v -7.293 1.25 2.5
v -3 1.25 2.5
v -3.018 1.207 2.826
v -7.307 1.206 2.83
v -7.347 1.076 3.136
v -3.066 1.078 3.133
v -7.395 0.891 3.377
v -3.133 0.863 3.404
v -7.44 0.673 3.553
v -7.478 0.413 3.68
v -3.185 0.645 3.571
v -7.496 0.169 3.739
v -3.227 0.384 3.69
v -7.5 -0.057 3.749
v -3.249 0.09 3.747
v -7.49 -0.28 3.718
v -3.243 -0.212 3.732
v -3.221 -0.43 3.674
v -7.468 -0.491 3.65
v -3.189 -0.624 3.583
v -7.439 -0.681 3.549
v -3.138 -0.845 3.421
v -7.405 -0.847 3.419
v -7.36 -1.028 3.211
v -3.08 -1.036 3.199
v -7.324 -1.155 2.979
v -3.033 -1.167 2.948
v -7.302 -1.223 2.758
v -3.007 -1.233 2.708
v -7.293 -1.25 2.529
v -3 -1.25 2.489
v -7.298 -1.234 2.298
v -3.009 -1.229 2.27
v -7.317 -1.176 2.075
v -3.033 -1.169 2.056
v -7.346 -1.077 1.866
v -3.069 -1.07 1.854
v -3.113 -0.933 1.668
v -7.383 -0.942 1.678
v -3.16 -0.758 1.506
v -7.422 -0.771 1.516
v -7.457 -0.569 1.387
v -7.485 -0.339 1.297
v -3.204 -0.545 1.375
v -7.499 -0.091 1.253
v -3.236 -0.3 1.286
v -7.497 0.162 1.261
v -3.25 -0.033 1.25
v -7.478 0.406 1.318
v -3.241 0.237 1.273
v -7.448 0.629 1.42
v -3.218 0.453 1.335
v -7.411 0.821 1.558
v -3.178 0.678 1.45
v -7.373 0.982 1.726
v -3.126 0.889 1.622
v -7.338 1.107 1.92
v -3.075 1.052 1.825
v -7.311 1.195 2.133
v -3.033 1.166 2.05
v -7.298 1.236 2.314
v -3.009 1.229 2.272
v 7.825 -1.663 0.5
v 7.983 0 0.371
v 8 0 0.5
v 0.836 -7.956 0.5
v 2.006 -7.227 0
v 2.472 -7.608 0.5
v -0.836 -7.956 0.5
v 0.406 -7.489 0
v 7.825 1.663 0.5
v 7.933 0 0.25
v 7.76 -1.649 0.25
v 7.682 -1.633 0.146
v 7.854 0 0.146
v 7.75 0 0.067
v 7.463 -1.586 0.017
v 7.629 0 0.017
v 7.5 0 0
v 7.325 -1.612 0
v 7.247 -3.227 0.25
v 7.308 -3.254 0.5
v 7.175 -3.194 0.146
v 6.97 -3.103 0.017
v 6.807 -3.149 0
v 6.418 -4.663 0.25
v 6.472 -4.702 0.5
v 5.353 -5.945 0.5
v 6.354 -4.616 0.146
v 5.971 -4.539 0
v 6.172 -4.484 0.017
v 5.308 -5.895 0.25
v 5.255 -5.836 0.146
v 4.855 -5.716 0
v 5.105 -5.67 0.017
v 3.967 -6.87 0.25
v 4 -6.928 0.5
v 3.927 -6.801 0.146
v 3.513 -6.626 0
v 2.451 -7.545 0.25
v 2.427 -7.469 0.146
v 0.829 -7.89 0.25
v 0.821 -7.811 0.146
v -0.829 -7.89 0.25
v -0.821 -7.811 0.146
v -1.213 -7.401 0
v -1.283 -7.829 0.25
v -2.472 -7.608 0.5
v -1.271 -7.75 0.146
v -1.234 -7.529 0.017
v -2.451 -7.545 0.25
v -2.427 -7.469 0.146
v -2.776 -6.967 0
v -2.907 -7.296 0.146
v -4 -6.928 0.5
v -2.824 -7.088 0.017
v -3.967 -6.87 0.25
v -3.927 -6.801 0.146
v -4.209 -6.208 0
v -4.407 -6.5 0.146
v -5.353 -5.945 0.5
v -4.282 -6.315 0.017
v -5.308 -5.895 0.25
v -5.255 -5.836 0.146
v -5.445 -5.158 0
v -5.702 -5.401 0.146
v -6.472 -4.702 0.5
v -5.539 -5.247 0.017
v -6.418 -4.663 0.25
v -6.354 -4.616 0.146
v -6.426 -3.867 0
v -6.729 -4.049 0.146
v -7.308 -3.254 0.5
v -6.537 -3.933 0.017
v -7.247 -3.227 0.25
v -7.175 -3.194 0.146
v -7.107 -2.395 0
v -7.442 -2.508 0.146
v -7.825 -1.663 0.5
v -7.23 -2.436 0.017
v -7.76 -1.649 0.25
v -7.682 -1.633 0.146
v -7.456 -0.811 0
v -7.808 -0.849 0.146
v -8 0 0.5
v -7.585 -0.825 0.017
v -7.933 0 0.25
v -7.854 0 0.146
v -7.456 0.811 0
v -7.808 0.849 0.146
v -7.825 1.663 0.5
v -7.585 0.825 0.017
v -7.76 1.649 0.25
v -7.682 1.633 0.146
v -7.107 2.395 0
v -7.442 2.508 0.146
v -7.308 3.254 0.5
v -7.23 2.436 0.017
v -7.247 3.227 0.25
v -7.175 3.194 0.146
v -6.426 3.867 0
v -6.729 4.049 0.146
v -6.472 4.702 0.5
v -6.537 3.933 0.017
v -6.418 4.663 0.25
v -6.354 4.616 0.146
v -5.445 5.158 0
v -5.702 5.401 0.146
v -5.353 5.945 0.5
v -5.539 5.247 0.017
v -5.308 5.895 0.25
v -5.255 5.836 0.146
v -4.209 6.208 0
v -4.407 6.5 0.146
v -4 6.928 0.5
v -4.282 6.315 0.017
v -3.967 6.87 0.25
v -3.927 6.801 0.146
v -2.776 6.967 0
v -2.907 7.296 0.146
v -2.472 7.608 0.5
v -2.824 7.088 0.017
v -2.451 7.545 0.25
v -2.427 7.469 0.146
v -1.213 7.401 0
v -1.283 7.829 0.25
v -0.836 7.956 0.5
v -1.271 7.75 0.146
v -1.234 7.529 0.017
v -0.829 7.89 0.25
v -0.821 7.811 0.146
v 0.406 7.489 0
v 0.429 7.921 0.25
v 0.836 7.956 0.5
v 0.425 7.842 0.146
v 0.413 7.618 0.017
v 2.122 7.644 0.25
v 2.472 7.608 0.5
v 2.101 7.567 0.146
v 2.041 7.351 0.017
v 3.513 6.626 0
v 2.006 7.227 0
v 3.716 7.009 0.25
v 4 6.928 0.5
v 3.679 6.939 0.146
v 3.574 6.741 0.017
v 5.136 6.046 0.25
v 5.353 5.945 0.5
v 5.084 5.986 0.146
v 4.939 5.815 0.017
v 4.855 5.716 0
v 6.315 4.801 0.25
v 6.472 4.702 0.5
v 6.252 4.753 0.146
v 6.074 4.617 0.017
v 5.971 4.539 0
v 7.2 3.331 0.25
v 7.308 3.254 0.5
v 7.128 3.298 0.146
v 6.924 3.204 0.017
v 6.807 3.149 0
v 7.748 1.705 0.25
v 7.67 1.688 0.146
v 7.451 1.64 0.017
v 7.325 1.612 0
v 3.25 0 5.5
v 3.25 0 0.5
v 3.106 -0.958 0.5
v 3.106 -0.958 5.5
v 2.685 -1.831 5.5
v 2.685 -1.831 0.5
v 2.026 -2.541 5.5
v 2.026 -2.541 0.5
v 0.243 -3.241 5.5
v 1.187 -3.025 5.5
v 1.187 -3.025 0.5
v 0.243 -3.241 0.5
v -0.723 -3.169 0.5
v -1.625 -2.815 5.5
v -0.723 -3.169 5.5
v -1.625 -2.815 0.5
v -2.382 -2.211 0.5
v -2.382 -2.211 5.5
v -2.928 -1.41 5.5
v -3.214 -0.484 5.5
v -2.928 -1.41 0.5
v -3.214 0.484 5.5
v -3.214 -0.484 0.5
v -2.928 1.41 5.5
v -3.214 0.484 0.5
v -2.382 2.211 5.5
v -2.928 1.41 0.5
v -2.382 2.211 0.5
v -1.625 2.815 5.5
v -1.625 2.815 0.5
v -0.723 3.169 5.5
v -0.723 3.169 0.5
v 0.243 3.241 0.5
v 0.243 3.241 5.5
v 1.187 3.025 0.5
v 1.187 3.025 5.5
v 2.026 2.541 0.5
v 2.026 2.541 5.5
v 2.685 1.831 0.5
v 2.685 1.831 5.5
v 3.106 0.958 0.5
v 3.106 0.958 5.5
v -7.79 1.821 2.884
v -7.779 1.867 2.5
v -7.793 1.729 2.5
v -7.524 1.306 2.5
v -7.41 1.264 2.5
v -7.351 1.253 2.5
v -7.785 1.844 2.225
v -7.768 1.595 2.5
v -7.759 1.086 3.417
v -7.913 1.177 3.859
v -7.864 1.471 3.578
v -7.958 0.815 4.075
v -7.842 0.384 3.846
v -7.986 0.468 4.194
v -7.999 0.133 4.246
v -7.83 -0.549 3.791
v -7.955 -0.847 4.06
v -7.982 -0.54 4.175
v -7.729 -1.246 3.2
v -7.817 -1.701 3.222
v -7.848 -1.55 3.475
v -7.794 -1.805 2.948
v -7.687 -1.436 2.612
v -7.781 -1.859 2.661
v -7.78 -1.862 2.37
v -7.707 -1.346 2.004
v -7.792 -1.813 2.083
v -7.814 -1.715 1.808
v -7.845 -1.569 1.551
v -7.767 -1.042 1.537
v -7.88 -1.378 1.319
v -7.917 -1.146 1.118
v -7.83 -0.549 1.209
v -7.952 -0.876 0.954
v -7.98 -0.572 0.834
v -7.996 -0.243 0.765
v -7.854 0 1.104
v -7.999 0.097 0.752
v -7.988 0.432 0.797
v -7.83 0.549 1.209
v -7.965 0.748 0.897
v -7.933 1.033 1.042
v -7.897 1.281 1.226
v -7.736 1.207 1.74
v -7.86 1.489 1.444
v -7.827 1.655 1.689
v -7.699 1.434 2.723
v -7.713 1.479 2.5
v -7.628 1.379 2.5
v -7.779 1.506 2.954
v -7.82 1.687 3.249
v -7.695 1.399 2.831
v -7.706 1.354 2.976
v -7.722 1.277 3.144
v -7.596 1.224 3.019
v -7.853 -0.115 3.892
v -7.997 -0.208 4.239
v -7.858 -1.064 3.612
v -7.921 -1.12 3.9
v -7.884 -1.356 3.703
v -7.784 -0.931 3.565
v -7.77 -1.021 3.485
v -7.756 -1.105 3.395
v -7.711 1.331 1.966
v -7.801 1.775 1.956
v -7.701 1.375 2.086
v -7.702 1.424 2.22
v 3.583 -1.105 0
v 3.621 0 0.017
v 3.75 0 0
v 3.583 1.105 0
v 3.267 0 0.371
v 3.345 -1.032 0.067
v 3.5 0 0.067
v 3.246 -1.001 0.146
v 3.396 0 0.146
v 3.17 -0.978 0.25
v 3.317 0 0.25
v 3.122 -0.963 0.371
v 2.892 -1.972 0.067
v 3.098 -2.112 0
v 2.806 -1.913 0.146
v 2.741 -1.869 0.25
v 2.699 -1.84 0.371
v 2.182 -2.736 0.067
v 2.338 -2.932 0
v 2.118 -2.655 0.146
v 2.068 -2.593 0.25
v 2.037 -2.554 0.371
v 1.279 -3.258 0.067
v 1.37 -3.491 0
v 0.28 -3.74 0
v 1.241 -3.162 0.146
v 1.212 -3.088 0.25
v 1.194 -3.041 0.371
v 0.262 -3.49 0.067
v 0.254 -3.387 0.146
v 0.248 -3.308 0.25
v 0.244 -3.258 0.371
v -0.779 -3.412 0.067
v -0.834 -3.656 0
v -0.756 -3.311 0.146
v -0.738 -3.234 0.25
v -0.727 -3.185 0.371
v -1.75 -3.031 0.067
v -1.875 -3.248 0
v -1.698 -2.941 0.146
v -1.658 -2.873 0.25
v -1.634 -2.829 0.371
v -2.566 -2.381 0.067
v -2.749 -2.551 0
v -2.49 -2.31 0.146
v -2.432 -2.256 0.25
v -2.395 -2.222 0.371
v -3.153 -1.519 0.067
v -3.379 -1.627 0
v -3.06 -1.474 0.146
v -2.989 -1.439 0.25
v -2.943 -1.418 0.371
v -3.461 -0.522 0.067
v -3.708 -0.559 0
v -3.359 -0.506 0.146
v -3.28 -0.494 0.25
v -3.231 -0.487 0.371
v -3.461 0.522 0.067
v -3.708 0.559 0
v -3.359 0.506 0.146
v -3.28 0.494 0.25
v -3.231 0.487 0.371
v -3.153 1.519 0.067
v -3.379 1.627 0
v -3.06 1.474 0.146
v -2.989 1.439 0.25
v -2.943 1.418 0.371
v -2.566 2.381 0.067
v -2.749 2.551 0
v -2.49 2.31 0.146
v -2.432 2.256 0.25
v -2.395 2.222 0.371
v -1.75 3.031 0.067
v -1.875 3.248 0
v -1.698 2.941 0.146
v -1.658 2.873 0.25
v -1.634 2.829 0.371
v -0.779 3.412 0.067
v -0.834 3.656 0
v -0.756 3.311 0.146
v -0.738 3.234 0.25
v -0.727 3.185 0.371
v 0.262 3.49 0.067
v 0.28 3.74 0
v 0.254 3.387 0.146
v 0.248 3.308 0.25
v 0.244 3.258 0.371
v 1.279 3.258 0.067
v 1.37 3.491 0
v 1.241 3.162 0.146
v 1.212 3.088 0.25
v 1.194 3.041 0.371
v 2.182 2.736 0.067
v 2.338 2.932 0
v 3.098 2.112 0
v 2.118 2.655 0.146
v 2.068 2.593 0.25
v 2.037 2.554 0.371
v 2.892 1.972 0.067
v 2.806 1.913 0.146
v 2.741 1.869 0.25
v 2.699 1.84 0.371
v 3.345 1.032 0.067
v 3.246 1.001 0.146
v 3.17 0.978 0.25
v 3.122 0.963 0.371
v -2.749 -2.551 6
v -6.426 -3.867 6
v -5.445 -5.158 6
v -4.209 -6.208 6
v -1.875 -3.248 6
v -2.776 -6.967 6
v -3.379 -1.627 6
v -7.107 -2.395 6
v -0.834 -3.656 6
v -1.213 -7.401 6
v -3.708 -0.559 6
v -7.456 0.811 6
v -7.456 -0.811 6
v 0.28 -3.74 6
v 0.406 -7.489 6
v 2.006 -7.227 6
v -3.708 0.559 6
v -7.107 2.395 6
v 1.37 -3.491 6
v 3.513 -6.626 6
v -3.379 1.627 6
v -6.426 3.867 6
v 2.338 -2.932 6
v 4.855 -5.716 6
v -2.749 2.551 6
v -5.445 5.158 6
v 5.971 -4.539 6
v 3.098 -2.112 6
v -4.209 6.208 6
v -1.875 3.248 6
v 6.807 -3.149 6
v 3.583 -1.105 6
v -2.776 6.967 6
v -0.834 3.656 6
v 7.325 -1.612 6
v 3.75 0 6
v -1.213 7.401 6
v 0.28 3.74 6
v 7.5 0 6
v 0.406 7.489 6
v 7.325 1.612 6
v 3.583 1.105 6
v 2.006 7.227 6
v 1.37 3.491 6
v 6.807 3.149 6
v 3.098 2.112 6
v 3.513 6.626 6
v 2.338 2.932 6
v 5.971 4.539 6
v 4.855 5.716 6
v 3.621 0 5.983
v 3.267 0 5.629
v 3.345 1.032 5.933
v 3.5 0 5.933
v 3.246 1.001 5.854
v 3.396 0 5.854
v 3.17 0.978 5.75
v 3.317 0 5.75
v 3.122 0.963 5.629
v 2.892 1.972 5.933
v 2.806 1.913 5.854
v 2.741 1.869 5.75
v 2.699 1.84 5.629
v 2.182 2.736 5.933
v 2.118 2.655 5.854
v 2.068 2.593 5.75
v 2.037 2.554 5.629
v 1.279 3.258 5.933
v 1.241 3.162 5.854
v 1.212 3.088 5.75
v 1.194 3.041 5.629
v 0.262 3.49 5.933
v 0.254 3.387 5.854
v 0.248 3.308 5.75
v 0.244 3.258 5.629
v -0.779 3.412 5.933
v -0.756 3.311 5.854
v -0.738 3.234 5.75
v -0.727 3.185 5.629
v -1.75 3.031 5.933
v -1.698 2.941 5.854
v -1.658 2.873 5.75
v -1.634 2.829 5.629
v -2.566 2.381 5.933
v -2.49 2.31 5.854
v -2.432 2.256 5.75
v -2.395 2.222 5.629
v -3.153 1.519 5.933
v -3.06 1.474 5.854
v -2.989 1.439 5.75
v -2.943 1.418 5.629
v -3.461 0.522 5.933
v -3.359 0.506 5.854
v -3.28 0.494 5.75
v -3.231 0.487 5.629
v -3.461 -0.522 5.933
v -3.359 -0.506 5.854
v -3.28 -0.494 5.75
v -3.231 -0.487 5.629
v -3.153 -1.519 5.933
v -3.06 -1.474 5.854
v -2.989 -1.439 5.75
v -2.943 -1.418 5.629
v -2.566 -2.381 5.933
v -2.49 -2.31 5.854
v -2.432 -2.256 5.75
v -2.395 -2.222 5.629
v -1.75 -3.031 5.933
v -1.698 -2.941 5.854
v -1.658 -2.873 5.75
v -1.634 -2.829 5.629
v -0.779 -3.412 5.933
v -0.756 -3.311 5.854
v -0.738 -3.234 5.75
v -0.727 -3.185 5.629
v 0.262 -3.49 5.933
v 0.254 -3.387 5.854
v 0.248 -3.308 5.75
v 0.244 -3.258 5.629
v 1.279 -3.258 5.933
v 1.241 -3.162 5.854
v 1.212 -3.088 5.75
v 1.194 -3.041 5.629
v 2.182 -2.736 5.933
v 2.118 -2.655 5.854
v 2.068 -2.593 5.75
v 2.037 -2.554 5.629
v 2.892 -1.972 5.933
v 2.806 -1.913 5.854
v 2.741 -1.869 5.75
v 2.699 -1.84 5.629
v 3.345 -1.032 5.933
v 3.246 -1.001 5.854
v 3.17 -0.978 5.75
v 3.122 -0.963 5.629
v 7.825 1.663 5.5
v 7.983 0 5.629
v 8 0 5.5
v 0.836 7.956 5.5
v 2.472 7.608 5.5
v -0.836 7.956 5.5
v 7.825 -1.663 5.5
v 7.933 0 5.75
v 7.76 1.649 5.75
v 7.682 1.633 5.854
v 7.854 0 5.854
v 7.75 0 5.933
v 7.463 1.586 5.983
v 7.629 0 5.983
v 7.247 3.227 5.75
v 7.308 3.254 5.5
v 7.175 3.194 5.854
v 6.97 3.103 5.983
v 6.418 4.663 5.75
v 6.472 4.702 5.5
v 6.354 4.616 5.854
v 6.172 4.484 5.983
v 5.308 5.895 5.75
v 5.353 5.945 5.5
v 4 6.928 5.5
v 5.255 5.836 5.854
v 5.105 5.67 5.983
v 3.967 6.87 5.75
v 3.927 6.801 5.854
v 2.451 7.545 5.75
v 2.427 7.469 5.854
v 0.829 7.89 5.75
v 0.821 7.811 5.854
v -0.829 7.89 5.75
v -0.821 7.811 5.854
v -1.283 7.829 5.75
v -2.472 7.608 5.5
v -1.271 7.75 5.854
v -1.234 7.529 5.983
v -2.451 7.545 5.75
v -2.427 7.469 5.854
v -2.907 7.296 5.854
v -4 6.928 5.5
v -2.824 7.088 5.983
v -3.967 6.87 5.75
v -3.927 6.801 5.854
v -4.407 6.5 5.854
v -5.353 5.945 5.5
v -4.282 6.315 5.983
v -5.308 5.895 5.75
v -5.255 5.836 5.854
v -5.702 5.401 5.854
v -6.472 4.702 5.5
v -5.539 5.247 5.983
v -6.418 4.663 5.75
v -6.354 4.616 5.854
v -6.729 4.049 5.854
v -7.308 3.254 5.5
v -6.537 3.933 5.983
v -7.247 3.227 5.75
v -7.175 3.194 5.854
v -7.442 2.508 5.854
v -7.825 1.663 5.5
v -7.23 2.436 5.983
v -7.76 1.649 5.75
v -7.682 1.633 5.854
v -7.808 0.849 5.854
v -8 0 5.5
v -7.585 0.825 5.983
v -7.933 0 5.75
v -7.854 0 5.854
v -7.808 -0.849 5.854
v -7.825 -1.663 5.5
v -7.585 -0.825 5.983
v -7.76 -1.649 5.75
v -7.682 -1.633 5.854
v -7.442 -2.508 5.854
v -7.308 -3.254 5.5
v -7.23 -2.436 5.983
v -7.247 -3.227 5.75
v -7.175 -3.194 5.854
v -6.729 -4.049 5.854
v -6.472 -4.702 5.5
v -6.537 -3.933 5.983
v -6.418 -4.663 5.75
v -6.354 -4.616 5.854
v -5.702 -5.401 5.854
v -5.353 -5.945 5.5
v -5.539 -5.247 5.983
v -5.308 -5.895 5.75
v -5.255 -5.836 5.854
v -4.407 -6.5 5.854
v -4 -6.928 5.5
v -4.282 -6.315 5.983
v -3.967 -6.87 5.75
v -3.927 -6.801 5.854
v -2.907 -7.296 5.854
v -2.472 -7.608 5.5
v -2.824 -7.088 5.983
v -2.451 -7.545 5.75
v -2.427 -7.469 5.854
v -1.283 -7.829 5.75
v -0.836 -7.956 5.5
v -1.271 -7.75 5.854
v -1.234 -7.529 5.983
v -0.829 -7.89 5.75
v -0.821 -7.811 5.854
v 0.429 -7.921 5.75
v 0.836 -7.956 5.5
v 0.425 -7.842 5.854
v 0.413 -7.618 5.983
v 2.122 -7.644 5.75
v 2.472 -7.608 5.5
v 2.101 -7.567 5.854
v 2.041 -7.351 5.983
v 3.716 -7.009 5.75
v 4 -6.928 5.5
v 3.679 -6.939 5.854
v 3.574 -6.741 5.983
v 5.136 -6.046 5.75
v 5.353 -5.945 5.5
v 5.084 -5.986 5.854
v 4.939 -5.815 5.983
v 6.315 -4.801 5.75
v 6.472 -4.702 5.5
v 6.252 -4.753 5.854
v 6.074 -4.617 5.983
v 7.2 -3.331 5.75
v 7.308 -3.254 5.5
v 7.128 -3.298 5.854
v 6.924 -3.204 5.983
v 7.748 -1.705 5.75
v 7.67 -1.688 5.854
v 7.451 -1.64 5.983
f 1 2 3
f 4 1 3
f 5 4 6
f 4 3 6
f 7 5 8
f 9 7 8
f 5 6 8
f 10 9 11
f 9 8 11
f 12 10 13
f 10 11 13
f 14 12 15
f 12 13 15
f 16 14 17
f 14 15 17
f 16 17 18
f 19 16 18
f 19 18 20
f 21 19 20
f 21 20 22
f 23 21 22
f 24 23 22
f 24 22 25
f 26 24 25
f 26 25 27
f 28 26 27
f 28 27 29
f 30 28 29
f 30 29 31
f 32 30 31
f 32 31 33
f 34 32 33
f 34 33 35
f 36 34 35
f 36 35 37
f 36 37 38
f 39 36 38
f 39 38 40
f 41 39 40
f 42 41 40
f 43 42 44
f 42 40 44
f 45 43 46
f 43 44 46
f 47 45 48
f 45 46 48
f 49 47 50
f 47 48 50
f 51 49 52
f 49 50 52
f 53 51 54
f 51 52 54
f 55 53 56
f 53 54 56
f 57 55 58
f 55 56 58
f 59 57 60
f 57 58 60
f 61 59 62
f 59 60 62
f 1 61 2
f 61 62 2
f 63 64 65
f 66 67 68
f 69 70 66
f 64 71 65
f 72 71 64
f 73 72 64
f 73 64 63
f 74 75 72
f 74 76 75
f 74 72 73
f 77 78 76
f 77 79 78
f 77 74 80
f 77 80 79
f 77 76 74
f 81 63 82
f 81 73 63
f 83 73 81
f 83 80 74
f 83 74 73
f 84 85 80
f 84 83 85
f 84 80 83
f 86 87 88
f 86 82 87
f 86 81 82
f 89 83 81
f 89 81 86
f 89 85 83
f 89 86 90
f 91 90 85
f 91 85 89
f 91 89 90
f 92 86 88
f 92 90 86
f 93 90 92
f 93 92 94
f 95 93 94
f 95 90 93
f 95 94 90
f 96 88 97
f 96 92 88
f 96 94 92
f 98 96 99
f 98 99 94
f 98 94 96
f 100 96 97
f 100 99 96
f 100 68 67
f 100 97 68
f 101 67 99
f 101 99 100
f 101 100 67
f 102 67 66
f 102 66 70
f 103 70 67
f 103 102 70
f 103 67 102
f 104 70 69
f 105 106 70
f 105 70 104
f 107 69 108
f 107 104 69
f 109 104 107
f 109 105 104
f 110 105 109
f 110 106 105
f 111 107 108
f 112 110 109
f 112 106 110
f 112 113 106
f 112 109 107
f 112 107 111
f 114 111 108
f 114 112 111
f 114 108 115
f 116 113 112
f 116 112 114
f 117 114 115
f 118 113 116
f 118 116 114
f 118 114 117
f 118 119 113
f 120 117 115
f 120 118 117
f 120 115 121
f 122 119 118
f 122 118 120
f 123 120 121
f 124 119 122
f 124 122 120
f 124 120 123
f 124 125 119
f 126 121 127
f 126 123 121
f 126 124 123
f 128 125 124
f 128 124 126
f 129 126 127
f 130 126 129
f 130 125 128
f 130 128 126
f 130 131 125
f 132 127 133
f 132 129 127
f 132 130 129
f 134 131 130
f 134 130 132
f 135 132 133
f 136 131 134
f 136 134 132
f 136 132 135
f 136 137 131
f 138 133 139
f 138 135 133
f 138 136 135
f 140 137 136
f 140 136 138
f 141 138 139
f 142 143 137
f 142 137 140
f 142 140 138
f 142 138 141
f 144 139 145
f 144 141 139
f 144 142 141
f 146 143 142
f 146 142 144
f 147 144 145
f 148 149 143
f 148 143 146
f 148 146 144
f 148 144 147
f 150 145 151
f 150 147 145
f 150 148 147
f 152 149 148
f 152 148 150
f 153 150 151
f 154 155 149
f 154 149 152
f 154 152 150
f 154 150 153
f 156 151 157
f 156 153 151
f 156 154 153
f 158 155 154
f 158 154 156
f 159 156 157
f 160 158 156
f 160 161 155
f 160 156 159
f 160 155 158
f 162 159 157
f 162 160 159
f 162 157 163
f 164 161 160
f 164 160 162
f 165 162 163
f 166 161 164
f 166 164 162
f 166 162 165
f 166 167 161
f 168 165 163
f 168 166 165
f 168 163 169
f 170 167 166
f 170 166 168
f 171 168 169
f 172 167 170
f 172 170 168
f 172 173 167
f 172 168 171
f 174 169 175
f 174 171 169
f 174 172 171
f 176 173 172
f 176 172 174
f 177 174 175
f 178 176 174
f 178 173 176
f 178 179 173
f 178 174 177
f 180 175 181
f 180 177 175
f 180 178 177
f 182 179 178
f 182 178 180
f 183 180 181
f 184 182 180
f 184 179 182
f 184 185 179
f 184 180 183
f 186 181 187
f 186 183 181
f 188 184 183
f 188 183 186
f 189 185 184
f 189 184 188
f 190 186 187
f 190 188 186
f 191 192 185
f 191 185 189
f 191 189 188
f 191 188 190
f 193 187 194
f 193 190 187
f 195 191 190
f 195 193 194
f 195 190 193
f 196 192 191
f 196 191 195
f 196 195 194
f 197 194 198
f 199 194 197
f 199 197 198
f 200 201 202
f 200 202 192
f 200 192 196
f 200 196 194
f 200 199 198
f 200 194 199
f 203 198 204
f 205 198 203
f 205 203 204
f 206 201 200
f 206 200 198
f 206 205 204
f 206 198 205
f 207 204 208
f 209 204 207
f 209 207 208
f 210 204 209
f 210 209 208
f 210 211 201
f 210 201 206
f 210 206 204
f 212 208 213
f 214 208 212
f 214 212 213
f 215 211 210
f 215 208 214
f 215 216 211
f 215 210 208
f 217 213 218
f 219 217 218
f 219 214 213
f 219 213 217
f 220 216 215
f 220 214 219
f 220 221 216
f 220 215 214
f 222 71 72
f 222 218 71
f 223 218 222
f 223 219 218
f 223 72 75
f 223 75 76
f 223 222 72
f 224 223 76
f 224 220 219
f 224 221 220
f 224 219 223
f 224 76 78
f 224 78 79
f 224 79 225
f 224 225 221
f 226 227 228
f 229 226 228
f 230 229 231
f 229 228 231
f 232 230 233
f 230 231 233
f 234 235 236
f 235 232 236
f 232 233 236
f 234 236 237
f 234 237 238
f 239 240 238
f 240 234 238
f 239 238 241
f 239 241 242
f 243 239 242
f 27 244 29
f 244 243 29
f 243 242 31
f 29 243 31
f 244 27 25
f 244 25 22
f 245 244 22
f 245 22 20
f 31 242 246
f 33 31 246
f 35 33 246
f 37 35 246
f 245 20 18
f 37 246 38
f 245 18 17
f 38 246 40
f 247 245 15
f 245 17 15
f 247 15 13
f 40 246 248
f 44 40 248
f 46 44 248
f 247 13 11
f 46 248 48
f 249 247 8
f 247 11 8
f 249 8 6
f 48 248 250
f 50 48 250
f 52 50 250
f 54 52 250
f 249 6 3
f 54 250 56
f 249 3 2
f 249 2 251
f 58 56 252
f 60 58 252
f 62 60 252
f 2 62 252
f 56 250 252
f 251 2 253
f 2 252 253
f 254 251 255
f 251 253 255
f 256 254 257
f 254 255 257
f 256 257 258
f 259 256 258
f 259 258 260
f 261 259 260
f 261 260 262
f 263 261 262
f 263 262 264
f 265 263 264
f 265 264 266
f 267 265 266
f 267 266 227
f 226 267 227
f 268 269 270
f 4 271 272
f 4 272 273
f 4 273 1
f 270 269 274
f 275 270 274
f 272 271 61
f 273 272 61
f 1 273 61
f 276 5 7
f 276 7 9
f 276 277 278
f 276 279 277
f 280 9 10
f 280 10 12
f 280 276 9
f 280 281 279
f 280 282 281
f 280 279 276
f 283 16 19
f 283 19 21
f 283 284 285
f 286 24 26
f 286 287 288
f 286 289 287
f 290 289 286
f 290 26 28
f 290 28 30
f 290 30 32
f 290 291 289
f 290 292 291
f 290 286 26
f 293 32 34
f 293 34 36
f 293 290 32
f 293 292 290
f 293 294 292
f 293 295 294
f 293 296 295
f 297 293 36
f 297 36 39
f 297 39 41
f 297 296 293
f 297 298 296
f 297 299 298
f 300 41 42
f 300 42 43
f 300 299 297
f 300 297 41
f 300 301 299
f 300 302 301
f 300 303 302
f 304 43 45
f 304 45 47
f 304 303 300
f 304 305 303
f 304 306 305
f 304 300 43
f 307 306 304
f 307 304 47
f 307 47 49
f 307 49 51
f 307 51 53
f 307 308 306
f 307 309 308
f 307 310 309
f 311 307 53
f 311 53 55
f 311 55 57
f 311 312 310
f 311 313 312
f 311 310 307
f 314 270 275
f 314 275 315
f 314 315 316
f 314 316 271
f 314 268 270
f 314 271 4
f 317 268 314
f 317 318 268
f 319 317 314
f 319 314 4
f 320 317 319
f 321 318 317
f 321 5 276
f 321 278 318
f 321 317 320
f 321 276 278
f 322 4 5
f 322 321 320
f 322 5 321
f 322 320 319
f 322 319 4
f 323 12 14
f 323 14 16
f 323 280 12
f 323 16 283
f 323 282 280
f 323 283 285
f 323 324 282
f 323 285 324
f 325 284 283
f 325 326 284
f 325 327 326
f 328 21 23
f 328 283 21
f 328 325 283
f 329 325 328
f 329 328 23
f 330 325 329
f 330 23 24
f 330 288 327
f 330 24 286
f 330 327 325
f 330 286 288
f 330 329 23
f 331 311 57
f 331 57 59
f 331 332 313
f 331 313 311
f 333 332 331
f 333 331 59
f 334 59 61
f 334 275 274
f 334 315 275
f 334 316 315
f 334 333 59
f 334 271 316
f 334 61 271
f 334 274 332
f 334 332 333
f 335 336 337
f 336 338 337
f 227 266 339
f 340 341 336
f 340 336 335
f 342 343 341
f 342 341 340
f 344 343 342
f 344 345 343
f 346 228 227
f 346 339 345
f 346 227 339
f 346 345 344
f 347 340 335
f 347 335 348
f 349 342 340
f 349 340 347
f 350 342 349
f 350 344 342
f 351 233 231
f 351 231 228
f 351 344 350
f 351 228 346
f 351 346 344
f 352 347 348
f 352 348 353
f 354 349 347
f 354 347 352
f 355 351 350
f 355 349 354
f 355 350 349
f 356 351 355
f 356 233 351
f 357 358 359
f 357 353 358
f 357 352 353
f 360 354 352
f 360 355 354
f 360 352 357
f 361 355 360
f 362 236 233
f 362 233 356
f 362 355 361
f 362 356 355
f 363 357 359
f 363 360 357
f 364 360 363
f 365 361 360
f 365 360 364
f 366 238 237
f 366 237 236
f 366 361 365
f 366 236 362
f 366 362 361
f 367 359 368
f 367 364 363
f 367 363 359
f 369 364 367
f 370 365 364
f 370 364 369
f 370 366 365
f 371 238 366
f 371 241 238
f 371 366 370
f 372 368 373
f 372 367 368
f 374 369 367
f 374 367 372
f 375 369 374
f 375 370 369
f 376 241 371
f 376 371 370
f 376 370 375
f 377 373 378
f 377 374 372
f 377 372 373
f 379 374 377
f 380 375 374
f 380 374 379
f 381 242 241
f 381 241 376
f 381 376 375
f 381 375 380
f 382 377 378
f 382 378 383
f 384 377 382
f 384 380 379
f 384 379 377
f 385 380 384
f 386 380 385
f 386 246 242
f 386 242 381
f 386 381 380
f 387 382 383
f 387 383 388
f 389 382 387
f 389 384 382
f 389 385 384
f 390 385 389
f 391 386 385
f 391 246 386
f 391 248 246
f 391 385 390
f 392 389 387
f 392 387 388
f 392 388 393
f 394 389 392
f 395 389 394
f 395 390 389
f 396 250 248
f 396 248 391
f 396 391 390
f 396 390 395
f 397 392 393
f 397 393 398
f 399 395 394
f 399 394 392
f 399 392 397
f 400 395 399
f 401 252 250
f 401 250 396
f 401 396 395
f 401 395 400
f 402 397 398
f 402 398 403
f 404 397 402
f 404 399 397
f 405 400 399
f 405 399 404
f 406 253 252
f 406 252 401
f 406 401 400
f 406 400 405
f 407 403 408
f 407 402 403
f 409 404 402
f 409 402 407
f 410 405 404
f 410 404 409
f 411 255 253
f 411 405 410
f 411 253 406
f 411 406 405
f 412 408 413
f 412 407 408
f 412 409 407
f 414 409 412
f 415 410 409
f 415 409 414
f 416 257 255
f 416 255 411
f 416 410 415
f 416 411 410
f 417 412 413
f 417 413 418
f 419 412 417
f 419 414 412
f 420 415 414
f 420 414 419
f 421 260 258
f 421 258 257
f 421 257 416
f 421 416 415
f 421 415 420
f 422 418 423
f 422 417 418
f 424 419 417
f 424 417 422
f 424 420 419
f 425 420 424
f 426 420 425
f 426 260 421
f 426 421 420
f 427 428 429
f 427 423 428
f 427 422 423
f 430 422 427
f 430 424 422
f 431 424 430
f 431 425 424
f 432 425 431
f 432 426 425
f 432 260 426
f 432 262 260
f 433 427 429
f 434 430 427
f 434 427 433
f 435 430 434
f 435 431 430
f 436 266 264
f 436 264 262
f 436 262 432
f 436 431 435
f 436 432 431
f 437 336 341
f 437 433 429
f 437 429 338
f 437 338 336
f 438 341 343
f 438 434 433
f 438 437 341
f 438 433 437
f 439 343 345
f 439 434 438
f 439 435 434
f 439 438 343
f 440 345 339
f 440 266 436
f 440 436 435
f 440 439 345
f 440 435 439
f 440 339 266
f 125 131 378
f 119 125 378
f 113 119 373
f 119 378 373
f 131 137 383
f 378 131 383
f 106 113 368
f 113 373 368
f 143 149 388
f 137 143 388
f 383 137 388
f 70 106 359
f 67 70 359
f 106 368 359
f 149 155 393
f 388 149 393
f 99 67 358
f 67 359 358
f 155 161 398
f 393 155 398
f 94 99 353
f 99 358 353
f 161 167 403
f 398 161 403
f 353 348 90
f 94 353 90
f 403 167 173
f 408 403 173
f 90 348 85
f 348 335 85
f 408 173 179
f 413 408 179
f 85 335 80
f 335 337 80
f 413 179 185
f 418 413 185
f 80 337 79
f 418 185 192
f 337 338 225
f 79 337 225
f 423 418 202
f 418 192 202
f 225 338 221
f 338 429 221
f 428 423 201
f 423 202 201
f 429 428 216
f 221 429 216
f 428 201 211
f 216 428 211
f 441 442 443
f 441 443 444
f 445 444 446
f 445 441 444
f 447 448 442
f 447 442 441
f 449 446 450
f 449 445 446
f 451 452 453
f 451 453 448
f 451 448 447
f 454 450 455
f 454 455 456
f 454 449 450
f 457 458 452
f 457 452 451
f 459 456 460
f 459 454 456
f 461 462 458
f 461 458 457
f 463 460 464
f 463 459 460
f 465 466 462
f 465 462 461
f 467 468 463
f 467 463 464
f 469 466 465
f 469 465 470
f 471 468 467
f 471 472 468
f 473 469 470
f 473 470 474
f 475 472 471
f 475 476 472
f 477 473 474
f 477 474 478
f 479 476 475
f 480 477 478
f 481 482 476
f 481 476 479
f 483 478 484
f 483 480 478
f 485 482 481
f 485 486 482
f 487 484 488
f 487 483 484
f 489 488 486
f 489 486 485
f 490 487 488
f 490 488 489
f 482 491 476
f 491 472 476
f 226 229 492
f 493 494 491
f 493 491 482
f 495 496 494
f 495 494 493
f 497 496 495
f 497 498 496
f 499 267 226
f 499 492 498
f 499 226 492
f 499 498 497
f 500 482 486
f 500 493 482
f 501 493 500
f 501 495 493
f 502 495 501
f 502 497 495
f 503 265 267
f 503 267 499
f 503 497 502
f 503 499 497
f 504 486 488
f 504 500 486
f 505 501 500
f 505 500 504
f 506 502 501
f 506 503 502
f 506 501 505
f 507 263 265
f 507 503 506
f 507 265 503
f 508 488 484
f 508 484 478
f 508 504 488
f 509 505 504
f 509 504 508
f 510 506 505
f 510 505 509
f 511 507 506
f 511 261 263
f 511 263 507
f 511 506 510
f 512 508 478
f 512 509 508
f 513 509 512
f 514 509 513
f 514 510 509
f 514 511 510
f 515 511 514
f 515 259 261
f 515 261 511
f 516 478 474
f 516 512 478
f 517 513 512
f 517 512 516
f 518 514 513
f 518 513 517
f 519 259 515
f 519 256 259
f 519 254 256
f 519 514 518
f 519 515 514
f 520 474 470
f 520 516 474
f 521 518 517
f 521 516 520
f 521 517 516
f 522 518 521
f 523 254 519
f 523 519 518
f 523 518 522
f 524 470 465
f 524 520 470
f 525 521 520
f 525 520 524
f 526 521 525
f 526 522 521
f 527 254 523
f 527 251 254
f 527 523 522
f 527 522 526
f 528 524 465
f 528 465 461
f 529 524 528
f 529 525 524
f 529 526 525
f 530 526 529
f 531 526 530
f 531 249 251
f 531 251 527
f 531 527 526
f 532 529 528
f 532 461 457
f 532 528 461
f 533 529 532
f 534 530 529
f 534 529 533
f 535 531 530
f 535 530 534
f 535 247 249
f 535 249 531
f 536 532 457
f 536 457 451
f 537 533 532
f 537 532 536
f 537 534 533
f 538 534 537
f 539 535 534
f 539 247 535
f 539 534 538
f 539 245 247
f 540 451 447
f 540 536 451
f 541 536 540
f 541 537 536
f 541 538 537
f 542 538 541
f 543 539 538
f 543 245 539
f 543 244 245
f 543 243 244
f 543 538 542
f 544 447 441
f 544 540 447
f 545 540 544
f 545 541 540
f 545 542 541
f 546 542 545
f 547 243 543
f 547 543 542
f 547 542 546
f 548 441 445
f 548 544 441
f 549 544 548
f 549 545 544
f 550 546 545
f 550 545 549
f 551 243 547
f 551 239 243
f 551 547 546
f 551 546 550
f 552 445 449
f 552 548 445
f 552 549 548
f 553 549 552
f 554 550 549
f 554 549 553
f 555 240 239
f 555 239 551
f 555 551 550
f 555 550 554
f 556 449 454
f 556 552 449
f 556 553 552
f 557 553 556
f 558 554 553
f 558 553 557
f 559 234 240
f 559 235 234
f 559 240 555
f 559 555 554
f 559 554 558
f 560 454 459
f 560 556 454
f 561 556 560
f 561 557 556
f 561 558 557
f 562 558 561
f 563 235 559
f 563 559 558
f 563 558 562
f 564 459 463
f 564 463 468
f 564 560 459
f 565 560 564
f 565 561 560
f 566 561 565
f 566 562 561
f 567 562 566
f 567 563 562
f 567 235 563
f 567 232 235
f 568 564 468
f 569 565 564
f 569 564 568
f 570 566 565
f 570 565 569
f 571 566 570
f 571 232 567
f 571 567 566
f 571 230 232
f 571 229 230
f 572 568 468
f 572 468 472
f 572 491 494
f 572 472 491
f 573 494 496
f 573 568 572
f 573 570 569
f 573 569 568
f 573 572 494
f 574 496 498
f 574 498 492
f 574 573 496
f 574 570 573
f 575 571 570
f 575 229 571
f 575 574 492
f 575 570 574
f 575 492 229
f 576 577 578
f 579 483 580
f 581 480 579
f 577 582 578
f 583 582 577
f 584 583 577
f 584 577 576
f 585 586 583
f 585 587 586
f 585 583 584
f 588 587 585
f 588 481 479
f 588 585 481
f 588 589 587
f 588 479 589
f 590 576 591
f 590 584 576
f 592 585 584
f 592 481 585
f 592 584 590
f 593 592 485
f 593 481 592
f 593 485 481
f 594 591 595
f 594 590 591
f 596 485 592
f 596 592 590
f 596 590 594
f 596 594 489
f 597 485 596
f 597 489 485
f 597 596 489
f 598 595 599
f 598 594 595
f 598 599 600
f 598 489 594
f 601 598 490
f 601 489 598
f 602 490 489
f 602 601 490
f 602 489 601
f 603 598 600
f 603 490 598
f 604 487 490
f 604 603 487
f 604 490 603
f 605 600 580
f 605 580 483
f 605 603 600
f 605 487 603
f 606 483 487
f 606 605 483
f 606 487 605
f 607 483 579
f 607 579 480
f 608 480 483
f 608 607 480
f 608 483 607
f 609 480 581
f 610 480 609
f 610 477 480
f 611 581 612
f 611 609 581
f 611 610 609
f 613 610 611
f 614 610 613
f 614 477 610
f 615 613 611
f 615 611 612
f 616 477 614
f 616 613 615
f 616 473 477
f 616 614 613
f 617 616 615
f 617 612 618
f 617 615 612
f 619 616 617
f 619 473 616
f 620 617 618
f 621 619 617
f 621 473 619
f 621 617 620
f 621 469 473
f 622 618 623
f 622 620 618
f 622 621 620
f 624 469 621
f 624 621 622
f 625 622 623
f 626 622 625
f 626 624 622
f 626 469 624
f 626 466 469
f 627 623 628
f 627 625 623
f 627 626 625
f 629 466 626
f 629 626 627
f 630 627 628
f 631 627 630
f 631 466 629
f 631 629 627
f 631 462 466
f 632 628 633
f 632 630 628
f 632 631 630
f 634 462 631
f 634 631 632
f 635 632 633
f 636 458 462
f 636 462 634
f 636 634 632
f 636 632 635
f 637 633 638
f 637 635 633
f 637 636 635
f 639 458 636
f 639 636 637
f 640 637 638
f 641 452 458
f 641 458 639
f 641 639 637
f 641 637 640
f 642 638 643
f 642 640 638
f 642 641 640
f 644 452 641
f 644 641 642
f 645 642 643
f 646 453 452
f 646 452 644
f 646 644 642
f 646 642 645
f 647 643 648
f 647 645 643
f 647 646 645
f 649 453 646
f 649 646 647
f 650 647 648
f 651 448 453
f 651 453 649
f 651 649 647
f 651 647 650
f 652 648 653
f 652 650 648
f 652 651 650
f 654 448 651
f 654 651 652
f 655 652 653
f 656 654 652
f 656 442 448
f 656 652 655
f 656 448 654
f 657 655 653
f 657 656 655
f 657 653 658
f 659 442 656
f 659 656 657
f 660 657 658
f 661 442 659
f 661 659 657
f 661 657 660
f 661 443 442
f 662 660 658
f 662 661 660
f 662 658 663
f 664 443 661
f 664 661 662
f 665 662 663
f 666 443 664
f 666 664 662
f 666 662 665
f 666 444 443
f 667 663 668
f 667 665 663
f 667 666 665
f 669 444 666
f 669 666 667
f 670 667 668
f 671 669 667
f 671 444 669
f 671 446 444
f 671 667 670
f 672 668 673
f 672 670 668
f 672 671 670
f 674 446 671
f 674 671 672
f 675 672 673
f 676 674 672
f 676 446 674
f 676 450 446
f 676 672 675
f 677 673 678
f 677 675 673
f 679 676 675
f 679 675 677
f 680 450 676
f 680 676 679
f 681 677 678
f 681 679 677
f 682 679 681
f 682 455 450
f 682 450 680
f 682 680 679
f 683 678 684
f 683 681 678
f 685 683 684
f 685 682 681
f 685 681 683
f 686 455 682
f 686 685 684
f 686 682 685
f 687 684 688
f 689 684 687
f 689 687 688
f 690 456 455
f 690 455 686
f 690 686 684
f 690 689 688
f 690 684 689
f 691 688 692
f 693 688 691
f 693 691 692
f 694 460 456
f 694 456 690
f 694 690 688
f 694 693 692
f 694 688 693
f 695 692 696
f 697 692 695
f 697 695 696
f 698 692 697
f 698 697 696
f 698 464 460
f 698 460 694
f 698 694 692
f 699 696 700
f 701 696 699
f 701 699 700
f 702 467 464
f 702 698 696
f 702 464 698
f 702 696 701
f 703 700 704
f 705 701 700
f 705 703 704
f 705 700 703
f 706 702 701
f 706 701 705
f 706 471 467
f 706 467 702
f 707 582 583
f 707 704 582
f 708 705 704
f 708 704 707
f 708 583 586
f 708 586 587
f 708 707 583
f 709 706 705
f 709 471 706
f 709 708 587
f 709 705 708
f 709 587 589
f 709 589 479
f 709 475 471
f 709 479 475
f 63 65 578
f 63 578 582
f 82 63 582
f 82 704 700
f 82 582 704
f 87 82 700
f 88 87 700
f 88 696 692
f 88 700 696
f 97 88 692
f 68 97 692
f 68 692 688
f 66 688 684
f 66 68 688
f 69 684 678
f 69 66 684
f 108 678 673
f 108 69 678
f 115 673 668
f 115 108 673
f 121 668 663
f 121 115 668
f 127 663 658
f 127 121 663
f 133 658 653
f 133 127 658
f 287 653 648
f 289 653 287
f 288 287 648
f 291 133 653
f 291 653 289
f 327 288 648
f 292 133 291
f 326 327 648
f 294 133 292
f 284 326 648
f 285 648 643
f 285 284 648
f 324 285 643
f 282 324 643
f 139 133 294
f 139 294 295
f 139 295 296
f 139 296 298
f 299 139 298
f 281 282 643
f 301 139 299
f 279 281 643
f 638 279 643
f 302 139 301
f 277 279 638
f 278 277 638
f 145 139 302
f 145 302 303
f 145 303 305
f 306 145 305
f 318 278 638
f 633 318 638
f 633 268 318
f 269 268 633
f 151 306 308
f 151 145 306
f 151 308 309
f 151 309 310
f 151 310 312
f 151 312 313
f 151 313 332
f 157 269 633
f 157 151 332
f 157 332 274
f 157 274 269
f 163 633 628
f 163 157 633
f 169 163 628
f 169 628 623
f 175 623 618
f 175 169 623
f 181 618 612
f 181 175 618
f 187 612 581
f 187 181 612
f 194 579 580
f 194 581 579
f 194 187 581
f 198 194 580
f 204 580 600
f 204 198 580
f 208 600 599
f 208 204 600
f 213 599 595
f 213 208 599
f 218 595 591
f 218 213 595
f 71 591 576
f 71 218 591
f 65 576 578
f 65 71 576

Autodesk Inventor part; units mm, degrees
ref_plane "YZ Plane" through (0, 0, 0) normal (1, 0, 0) x (0, 1, 0)
ref_plane "XZ Plane" through (0, 0, 0) normal (0, 1, 0) x (-1, 0, 0)
ref_plane "XY Plane" through (0, 0, 0) normal (0, 0, 1) x (1, 0, 0)
sketch "Sketch1" plane through (0, 0, 0) normal (0, 0, 1) x (1, 0, 0)
  circle A0 centre (0, 0) radius 3.25
  circle A1 centre (0, 0) radius 8
  dimension "d0" = 6.5
  dimension "d1" = 16
extrude "Extrusion1" add sketch "Sketch1" along normal blind 6
sketch "Sketch2" plane through (0, 0, 0) normal (1, 0, 0) x (0, 1, 0)
  circle A0 centre (0, 2.5) radius 1.25
  point P0 (0, 0)
  dimension "d4" = 2.5
extrude "Extrusion2" cut sketch "Sketch2" against normal blind 20
fillet "Fillet1" radius 0.5 1 edges at (-8, 0, 6)
fillet "Fillet2" radius 0.5 4 edges at (-7.9017, -1.25, 2.4978) (-8, 0, 0) (-3.25, 0, 0) (-3.25, 0, 6)
properties part number "6mmRingBracket"
